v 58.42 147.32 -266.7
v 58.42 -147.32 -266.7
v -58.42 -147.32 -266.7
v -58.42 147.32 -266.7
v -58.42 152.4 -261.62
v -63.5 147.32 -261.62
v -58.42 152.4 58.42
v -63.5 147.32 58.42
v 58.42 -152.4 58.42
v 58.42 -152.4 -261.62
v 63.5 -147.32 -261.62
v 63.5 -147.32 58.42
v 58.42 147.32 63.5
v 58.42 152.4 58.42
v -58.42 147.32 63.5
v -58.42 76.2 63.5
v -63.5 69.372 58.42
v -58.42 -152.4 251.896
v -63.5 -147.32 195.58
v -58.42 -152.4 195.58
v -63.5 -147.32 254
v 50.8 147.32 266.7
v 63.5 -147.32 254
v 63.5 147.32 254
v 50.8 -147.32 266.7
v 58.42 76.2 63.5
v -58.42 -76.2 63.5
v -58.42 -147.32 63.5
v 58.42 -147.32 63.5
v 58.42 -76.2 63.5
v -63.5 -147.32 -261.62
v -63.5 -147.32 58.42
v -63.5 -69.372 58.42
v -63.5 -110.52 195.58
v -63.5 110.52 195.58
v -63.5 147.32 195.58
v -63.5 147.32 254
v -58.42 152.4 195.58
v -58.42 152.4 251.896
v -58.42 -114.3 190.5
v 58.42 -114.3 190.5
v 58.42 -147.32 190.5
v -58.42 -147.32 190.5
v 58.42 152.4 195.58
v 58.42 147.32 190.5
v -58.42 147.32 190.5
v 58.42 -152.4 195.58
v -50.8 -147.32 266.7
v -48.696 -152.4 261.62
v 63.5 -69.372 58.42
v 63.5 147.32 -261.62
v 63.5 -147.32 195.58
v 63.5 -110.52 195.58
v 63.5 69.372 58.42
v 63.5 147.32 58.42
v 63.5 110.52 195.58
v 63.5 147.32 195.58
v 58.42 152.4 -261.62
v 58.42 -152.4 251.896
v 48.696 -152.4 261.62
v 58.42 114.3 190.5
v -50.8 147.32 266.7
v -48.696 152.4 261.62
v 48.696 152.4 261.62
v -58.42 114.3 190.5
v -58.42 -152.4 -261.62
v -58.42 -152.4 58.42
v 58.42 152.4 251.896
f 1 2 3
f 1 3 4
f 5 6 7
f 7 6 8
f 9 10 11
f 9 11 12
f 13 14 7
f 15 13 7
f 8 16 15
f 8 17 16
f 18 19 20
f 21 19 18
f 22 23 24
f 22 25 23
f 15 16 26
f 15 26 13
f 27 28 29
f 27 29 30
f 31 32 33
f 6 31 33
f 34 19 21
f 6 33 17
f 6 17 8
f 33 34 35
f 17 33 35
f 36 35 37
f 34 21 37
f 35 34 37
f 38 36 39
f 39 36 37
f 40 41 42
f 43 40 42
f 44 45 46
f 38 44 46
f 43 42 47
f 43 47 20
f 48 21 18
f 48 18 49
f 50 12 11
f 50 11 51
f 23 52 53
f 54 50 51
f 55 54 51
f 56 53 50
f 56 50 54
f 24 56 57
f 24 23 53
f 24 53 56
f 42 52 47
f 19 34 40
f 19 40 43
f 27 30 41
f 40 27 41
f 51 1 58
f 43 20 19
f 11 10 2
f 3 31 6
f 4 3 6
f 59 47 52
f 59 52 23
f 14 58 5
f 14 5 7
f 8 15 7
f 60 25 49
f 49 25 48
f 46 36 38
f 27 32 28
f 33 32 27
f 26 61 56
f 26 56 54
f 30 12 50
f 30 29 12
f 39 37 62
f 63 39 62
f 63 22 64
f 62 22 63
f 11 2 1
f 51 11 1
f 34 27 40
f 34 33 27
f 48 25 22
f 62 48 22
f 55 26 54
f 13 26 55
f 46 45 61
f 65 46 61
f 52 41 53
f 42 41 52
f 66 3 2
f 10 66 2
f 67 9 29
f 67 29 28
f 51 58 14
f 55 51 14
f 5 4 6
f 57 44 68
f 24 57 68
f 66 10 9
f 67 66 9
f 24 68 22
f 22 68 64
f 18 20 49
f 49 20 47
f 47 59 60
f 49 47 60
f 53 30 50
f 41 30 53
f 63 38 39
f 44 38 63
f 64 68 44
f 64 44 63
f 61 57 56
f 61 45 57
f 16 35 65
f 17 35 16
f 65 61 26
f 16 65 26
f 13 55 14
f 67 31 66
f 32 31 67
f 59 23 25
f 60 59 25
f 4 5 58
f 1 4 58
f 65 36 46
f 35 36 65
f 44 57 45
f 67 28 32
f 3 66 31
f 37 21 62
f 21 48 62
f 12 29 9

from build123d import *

# Parameters (mm, degrees)
F0_W          = 304.8
F0_H          = 533.4
F1_DEPTH      = 63.5
F1_DEPTH_BACK = 63.5
F3_DEPTH      = 127
F4_SIZE       = 12.7
F5_SIZE       = 5.08


# Not quite as in the source:
# - a feature names something its author has since deleted; it is built from what else it names


with BuildPart() as f1:
    # F0 (on Right) → F1 (new body, two sides)
    with BuildSketch(Plane.YZ) as f1_sk:
        Rectangle(F0_W, F0_H)
    extrude(amount=F1_DEPTH)
    extrude(f1_sk.sketch, amount=-F1_DEPTH_BACK)

    # F2 (on face) → F3 (cut, through all)
    with BuildSketch(Plane.YZ.offset(63.5)):
        Polygon((-114.3, 190.5), (-152.4, 190.5), (-152.4, 63.5), (-76.2, 63.5), align=None)
        Polygon((152.4, 190.5), (114.3, 190.5), (76.2, 63.5), (152.4, 63.5), align=None)
    extrude(amount=-F3_DEPTH, mode=Mode.SUBTRACT)

    # F4
    f4_edges = [f1.edges().sort_by_distance(p)[0] for p in [
        (63.5, 0, 266.7),
        (-63.5, 0, 266.7),
    ]]
    chamfer(f4_edges, length=F4_SIZE)

    # F5
    f5_edges = [f1.edges().sort_by_distance(p)[0] for p in [
        (63.5, -114.3, 63.5),
        (63.5, -95.25, 127),
        (63.5, -133.35, 190.5),
        (63.5, -152.4, 222.25),
        (57.15, -152.4, 260.35),
        (0, -152.4, 266.7),
        (-63.5, -152.4, 222.25),
        (0, -152.4, 190.5),
        (0, -152.4, 63.5),
        (-63.5, -114.3, 63.5),
        (-63.5, -95.25, 127),
        (-63.5, -133.35, 190.5),
        (-57.15, -152.4, 260.35),
        (-63.5, -152.4, -101.6),
        (0, -152.4, -266.7),
        (63.5, -152.4, -101.6),
        (-63.5, 0, -266.7),
        (63.5, 0, -266.7),
        (0, 152.4, -266.7),
        (63.5, 152.4, -101.6),
        (63.5, 114.3, 63.5),
        (63.5, 95.25, 127),
        (63.5, 133.35, 190.5),
        (63.5, 152.4, 222.25),
        (57.15, 152.4, 260.35),
        (0, 152.4, 266.7),
        (-57.15, 152.4, 260.35),
        (-63.5, 152.4, 222.25),
        (-63.5, 133.35, 190.5),
        (-63.5, 95.25, 127),
        (0, 152.4, 190.5),
        (-63.5, 114.3, 63.5),
        (0, 152.4, 63.5),
        (-63.5, 152.4, -101.6),
    ]]
    chamfer(f5_edges, length=F5_SIZE)


solid = f1.part
